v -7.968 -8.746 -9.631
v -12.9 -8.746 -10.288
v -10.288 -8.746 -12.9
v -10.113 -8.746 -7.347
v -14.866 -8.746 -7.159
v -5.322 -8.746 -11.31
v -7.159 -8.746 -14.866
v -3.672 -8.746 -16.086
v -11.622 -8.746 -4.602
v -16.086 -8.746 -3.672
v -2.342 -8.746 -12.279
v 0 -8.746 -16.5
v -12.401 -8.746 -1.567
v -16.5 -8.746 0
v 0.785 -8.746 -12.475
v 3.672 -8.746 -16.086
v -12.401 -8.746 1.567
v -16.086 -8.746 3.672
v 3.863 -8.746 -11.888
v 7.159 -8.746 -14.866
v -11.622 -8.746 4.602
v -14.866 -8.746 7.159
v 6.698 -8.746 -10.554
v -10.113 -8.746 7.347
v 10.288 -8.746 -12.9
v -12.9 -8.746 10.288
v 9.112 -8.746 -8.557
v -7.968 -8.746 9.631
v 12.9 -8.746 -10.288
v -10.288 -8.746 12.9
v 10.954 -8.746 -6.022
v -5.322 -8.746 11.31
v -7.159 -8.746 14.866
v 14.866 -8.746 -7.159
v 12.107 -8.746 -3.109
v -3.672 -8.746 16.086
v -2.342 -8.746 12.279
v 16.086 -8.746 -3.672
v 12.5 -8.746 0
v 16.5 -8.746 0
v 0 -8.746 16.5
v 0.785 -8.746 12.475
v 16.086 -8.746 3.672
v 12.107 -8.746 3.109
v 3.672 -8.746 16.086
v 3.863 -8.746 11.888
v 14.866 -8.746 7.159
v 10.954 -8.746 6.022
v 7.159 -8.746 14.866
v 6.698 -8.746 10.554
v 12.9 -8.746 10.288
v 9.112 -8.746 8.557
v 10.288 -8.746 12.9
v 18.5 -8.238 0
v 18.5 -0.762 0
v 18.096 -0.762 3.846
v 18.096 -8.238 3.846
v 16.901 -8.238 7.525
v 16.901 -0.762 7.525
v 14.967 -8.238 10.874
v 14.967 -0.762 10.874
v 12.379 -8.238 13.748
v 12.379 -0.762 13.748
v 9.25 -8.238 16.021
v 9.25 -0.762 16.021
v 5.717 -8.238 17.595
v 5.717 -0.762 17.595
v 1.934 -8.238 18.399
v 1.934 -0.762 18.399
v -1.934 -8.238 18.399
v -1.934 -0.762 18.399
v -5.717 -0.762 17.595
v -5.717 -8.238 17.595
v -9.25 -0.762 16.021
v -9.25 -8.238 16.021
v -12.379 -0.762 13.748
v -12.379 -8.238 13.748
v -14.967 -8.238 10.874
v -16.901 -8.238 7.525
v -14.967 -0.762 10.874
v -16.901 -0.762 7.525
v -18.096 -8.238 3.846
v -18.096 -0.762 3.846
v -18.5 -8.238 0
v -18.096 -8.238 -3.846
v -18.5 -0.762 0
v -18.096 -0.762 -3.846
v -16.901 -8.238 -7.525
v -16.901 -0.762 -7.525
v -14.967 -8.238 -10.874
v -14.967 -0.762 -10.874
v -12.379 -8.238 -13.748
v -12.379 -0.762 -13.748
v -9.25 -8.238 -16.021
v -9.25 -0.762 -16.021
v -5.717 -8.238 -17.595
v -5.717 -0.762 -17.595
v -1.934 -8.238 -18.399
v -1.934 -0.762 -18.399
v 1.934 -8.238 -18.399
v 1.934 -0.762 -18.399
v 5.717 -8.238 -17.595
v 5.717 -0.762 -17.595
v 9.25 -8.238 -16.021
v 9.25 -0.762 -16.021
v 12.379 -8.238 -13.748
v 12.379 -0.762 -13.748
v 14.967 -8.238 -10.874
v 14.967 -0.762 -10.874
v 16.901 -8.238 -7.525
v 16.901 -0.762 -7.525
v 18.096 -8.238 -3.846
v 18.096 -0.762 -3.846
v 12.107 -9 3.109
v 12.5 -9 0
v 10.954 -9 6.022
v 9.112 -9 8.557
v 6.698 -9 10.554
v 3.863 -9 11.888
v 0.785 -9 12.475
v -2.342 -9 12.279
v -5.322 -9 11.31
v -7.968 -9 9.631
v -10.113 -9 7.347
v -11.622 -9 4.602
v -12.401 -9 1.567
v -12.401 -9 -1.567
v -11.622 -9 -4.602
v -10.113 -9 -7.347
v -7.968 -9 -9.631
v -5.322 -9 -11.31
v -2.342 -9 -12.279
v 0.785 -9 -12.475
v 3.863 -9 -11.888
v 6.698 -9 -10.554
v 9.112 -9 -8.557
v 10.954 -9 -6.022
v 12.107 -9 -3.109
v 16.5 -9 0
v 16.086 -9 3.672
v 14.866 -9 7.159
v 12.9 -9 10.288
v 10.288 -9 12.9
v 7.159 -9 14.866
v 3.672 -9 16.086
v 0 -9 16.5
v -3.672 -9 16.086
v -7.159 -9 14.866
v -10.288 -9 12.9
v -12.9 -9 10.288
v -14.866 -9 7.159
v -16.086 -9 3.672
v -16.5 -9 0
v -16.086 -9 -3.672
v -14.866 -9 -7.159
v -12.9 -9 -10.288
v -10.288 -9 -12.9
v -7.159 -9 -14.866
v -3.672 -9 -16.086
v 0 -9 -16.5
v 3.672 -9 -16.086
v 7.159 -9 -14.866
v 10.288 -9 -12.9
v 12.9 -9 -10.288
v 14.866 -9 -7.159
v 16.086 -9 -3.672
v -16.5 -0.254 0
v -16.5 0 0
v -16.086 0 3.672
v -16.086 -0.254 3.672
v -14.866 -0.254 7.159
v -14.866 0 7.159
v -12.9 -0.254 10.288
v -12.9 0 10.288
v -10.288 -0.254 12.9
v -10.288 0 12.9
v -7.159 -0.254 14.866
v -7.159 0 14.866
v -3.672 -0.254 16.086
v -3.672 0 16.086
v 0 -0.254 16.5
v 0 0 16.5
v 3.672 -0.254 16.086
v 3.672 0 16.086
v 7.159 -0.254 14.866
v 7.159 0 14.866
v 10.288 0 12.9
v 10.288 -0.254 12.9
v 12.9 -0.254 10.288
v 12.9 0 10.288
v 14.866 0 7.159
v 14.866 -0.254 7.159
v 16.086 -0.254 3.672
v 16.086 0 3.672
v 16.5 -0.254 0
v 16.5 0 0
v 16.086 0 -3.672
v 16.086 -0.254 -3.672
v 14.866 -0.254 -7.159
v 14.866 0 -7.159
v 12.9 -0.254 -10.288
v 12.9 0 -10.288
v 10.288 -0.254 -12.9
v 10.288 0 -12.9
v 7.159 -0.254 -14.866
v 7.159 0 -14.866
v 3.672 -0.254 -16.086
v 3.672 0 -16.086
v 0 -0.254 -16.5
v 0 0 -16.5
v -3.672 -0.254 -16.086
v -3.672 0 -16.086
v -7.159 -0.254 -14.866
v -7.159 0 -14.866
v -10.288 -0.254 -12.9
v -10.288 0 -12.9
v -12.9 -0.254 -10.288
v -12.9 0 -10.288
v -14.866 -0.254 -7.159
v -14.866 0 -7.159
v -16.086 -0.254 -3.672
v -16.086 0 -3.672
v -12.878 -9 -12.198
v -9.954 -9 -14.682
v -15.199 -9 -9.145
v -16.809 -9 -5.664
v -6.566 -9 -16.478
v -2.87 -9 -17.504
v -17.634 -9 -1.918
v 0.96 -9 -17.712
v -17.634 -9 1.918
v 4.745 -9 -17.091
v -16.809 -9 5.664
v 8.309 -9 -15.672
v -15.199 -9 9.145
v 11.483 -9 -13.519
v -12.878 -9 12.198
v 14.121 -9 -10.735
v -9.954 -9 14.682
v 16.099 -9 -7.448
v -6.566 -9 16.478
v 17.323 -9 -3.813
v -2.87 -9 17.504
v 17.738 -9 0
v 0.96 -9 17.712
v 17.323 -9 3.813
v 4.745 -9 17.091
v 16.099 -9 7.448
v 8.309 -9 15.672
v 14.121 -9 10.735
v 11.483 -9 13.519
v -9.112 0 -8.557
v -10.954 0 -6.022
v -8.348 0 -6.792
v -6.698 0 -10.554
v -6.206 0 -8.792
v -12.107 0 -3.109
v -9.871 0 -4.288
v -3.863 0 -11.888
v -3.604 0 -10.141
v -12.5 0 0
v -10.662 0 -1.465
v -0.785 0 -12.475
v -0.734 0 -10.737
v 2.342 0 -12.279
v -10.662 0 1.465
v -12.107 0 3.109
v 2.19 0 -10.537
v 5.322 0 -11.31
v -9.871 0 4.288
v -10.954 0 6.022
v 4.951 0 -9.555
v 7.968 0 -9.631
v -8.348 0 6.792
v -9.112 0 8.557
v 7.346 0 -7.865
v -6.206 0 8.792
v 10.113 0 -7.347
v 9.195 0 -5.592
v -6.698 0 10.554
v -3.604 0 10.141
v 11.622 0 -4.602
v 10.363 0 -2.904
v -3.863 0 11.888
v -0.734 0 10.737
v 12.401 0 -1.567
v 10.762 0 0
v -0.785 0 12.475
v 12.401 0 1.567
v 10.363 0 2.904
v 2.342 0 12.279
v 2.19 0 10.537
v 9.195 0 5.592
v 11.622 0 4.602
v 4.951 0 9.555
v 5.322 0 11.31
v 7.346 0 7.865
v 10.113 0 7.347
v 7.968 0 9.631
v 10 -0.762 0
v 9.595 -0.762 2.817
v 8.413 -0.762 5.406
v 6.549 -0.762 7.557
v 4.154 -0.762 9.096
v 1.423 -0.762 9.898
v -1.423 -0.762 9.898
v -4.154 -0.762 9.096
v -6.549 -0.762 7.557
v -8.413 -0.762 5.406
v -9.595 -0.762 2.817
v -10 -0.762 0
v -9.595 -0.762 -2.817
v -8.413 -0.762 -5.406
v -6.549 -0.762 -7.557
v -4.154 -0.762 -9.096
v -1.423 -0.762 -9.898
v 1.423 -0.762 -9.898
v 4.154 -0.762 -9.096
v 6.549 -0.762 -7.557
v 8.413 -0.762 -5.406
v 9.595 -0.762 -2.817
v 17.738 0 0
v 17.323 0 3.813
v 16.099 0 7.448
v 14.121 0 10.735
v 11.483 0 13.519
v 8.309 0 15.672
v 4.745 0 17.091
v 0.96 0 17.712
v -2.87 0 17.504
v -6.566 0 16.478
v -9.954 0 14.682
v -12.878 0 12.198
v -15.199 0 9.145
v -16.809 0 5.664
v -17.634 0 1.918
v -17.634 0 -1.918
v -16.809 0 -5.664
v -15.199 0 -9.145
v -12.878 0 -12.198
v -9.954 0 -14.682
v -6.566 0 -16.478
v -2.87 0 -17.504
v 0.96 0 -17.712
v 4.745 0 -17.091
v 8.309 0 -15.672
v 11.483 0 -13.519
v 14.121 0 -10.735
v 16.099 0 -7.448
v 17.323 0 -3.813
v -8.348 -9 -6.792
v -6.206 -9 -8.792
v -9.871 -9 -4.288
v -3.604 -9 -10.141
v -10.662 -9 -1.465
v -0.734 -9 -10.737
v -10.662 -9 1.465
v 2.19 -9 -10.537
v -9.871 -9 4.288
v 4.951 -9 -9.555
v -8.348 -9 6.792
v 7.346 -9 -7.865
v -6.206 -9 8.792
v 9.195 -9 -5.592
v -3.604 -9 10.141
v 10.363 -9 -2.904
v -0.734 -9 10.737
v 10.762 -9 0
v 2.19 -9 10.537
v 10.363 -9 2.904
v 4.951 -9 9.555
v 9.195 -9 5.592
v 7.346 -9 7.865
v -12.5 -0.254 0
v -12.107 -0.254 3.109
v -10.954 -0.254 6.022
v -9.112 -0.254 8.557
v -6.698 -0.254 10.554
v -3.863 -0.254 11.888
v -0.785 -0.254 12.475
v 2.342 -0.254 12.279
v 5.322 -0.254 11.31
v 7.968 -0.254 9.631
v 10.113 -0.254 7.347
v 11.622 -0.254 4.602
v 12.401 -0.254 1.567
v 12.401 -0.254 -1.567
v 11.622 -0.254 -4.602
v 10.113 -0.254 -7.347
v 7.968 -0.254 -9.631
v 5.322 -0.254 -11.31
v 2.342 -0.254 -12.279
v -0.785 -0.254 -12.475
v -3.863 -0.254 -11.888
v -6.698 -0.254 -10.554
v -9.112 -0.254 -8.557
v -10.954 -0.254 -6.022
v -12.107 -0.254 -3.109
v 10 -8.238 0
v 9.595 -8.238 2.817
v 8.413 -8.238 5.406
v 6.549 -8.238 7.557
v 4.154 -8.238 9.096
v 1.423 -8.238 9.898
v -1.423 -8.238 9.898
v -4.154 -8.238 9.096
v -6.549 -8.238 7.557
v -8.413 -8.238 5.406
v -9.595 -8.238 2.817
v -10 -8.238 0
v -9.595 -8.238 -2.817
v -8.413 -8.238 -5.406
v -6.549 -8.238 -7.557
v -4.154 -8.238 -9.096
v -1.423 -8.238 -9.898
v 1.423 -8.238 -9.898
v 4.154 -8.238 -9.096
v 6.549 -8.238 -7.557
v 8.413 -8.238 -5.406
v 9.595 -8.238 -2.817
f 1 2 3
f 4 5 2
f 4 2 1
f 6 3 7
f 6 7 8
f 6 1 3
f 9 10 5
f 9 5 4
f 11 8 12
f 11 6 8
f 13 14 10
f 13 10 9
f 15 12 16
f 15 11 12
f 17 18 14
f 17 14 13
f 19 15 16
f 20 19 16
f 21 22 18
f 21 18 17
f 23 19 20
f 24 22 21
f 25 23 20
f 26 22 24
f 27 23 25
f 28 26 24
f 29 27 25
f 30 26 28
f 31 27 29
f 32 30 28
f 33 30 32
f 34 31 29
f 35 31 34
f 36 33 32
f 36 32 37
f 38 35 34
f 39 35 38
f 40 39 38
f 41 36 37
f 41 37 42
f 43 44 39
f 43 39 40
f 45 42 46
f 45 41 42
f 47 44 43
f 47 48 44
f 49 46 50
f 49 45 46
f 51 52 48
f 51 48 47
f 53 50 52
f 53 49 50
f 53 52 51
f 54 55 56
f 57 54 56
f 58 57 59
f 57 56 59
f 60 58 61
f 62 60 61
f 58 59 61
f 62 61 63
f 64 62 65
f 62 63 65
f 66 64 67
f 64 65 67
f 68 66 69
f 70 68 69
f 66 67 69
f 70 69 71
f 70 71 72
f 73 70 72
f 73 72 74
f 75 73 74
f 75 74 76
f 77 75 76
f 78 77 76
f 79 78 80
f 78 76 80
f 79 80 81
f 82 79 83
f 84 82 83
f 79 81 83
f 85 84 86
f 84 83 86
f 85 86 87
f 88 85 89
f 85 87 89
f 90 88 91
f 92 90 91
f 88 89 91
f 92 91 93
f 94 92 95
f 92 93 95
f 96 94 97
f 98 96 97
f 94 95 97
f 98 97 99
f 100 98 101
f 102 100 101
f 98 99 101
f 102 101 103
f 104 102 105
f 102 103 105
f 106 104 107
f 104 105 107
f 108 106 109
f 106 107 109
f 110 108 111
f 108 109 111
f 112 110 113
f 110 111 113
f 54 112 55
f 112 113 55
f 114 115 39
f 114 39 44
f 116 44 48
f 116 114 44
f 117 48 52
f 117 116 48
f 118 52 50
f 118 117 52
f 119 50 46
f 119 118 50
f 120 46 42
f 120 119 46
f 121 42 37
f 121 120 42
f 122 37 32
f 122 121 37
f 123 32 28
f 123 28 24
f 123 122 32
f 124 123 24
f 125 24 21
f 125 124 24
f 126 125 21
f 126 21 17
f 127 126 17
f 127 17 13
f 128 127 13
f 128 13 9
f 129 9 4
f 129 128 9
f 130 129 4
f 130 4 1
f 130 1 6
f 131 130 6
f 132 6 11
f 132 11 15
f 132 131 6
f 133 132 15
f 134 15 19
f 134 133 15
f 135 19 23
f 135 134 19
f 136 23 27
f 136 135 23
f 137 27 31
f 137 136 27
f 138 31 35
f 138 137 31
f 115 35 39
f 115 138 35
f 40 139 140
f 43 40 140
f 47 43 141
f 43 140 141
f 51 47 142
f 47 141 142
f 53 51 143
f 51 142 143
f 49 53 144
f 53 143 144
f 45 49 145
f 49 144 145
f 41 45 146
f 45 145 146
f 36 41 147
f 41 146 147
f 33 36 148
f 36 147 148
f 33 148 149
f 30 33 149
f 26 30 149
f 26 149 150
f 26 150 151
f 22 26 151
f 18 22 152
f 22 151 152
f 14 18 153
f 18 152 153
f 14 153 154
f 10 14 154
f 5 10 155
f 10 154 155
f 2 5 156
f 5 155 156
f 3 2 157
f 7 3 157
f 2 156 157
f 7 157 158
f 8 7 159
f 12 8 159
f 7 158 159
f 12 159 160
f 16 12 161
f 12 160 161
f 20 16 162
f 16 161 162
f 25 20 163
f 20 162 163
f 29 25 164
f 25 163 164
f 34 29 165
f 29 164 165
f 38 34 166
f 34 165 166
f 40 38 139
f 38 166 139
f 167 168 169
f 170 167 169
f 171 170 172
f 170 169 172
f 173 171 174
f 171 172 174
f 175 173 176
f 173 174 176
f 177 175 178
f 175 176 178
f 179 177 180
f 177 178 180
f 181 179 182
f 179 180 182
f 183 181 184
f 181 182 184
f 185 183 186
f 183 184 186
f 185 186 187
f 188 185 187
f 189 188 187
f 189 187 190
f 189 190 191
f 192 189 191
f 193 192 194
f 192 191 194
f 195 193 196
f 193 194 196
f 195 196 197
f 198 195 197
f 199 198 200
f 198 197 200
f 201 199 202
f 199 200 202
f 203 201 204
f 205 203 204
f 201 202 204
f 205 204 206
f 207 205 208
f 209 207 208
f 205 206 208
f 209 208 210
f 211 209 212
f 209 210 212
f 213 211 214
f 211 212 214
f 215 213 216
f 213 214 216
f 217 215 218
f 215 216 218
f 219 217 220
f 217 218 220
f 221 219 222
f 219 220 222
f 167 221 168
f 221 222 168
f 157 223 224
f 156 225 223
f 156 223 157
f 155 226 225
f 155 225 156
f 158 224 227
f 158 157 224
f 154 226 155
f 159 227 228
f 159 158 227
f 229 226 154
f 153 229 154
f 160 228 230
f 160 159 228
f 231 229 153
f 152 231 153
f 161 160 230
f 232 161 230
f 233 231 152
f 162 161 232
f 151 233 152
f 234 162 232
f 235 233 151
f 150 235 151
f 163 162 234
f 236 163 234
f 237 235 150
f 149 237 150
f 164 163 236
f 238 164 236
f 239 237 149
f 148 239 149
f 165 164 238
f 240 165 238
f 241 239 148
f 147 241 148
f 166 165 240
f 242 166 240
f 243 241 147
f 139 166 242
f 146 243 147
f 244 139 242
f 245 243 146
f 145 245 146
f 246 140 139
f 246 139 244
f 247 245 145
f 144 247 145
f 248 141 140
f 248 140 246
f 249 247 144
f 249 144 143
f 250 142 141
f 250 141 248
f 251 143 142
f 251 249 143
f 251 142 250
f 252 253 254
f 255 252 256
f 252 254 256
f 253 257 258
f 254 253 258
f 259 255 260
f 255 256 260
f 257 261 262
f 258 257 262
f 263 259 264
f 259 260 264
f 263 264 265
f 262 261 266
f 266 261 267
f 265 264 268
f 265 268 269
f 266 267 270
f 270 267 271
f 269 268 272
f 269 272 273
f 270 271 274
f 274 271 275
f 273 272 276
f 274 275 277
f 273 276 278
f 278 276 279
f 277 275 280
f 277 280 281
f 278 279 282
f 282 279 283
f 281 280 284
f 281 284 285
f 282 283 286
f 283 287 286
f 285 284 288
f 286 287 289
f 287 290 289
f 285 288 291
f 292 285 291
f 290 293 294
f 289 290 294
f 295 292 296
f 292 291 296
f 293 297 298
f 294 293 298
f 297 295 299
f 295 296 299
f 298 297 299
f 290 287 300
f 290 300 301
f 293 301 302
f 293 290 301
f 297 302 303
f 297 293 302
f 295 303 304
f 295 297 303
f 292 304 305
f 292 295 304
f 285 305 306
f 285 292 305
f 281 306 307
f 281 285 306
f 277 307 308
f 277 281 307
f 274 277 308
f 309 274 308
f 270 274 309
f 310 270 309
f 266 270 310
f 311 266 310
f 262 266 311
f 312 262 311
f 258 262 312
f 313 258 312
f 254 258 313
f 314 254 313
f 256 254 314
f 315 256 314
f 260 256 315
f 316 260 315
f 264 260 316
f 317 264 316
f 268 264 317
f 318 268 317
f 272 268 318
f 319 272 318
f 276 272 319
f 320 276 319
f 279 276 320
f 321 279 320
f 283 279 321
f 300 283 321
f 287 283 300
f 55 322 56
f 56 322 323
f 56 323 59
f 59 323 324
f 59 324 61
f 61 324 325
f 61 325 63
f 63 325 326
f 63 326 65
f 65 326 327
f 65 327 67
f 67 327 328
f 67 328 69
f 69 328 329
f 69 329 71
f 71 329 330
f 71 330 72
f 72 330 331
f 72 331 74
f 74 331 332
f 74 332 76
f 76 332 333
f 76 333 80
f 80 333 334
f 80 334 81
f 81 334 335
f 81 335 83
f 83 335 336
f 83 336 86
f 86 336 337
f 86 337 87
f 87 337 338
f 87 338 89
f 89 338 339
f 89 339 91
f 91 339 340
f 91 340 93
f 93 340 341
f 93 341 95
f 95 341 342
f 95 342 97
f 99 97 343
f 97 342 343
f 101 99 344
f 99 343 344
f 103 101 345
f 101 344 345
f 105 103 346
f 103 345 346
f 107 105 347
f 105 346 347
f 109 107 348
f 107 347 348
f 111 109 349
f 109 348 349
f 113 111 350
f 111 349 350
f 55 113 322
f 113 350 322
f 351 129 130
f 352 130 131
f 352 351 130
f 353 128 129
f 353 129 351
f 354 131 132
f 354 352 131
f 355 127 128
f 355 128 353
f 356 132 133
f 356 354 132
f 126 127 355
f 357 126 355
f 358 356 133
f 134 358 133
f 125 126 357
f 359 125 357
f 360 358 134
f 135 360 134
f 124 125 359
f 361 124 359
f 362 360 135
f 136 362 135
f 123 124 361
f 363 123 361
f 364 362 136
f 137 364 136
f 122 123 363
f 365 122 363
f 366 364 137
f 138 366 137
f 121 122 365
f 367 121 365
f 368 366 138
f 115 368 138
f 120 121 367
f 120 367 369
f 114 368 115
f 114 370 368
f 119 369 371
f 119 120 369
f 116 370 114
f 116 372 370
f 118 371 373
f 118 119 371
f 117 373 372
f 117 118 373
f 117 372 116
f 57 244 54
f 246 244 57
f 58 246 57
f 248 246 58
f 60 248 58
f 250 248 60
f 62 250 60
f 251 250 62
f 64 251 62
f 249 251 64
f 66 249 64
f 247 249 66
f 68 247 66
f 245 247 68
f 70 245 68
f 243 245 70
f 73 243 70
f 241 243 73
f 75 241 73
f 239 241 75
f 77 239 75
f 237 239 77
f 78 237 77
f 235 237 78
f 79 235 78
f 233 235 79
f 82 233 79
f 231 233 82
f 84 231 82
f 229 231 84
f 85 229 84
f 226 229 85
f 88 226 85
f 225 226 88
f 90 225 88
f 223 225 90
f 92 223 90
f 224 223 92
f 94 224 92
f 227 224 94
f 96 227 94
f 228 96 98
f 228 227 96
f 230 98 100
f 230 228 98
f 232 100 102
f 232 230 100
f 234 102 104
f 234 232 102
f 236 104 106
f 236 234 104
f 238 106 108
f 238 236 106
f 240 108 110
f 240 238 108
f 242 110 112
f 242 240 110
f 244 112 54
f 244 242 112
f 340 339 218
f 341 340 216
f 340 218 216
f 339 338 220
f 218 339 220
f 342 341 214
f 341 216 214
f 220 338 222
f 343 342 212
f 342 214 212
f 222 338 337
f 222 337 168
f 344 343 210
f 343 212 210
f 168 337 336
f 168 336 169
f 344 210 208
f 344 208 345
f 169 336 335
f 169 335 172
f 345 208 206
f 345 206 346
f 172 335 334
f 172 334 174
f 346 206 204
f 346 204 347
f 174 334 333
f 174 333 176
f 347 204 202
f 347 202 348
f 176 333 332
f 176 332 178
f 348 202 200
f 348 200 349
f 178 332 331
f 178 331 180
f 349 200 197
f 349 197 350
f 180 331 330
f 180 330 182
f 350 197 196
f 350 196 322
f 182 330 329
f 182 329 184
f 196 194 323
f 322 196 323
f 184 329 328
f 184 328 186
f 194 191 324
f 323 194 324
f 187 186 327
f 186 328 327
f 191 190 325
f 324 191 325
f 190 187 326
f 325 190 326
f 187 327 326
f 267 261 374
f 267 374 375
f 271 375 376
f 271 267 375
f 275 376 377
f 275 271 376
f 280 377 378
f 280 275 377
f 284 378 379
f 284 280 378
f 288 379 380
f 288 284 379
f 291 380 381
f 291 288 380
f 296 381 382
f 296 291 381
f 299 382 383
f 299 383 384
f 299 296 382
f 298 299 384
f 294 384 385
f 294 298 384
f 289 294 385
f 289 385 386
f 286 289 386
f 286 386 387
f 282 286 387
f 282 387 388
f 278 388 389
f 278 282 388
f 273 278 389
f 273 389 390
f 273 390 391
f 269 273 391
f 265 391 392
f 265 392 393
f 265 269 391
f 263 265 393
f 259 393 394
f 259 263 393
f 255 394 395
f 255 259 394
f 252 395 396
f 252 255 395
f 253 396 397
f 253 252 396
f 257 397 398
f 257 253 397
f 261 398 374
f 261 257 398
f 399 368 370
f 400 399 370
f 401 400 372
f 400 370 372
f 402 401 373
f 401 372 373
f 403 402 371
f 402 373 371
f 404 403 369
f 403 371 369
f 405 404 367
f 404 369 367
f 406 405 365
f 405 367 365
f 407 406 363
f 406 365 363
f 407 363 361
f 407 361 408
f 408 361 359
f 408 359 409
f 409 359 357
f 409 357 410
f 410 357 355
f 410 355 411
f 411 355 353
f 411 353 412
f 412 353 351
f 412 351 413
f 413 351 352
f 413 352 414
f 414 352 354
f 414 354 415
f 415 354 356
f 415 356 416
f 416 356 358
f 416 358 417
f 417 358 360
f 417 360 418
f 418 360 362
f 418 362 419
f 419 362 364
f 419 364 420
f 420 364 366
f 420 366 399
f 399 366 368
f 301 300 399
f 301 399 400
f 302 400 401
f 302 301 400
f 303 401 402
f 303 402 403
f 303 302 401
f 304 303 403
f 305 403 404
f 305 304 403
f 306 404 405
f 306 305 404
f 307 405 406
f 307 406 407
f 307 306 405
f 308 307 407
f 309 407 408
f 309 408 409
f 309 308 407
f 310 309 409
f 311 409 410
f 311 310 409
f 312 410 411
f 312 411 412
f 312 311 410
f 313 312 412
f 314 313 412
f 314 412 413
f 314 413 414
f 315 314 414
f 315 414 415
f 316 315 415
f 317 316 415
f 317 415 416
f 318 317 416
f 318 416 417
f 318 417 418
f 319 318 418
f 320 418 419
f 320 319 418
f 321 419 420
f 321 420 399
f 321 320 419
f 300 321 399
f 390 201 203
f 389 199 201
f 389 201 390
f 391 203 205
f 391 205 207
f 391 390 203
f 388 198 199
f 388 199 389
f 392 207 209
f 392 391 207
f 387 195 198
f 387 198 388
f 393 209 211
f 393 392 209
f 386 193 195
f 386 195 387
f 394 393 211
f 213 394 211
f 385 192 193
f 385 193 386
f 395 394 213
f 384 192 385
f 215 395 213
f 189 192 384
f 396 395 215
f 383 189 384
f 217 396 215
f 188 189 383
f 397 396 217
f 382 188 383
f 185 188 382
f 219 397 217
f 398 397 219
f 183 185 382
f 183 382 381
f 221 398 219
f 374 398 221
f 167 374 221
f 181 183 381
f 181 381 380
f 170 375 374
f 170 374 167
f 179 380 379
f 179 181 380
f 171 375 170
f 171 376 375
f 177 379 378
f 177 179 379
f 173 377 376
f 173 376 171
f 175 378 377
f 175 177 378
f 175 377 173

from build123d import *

# Parameters (mm, degrees)
F0_R     = 18.5
F0_R_2   = 10
F1_DEPTH = 9
F2_SIZE  = 0.762
F3_R     = 16.5
F3_R_2   = 12.5
F4_DEPTH = 0.254
F5_R     = 16.5
F5_R_2   = 12.5
F6_DEPTH = 0.254


with BuildPart() as f1:
    # F0 (on Front) → F1 (new body)
    with BuildSketch(Plane.XZ):
        Circle(F0_R)
        Circle(F0_R_2, mode=Mode.SUBTRACT)
    extrude(amount=F1_DEPTH)

    # F2
    f2_edges = [f1.edges().sort_by_distance(p)[0] for p in [
        (18.5, -4.5, 0),
        (-18.5, 0, 0),
        (-18.5, -9, 0),
        (10, -4.5, 0),
        (-10, 0, 0),
        (-10, -9, 0),
    ]]
    chamfer(f2_edges, length=F2_SIZE)

    # F3 (on face) → F4 (cut)
    with BuildSketch(Plane(origin=(0, 0, 0), x_dir=(-1, 0, 0), z_dir=(0, 1, 0))):
        Circle(F3_R)
        Circle(F3_R_2, mode=Mode.SUBTRACT)
    extrude(amount=-F4_DEPTH, mode=Mode.SUBTRACT)

    # F5 (on face) → F6 (cut)
    with BuildSketch(Plane.XZ.offset(9)):
        Circle(F5_R)
        Circle(F5_R_2, mode=Mode.SUBTRACT)
    extrude(amount=-F6_DEPTH, mode=Mode.SUBTRACT)


solid = f1.part
